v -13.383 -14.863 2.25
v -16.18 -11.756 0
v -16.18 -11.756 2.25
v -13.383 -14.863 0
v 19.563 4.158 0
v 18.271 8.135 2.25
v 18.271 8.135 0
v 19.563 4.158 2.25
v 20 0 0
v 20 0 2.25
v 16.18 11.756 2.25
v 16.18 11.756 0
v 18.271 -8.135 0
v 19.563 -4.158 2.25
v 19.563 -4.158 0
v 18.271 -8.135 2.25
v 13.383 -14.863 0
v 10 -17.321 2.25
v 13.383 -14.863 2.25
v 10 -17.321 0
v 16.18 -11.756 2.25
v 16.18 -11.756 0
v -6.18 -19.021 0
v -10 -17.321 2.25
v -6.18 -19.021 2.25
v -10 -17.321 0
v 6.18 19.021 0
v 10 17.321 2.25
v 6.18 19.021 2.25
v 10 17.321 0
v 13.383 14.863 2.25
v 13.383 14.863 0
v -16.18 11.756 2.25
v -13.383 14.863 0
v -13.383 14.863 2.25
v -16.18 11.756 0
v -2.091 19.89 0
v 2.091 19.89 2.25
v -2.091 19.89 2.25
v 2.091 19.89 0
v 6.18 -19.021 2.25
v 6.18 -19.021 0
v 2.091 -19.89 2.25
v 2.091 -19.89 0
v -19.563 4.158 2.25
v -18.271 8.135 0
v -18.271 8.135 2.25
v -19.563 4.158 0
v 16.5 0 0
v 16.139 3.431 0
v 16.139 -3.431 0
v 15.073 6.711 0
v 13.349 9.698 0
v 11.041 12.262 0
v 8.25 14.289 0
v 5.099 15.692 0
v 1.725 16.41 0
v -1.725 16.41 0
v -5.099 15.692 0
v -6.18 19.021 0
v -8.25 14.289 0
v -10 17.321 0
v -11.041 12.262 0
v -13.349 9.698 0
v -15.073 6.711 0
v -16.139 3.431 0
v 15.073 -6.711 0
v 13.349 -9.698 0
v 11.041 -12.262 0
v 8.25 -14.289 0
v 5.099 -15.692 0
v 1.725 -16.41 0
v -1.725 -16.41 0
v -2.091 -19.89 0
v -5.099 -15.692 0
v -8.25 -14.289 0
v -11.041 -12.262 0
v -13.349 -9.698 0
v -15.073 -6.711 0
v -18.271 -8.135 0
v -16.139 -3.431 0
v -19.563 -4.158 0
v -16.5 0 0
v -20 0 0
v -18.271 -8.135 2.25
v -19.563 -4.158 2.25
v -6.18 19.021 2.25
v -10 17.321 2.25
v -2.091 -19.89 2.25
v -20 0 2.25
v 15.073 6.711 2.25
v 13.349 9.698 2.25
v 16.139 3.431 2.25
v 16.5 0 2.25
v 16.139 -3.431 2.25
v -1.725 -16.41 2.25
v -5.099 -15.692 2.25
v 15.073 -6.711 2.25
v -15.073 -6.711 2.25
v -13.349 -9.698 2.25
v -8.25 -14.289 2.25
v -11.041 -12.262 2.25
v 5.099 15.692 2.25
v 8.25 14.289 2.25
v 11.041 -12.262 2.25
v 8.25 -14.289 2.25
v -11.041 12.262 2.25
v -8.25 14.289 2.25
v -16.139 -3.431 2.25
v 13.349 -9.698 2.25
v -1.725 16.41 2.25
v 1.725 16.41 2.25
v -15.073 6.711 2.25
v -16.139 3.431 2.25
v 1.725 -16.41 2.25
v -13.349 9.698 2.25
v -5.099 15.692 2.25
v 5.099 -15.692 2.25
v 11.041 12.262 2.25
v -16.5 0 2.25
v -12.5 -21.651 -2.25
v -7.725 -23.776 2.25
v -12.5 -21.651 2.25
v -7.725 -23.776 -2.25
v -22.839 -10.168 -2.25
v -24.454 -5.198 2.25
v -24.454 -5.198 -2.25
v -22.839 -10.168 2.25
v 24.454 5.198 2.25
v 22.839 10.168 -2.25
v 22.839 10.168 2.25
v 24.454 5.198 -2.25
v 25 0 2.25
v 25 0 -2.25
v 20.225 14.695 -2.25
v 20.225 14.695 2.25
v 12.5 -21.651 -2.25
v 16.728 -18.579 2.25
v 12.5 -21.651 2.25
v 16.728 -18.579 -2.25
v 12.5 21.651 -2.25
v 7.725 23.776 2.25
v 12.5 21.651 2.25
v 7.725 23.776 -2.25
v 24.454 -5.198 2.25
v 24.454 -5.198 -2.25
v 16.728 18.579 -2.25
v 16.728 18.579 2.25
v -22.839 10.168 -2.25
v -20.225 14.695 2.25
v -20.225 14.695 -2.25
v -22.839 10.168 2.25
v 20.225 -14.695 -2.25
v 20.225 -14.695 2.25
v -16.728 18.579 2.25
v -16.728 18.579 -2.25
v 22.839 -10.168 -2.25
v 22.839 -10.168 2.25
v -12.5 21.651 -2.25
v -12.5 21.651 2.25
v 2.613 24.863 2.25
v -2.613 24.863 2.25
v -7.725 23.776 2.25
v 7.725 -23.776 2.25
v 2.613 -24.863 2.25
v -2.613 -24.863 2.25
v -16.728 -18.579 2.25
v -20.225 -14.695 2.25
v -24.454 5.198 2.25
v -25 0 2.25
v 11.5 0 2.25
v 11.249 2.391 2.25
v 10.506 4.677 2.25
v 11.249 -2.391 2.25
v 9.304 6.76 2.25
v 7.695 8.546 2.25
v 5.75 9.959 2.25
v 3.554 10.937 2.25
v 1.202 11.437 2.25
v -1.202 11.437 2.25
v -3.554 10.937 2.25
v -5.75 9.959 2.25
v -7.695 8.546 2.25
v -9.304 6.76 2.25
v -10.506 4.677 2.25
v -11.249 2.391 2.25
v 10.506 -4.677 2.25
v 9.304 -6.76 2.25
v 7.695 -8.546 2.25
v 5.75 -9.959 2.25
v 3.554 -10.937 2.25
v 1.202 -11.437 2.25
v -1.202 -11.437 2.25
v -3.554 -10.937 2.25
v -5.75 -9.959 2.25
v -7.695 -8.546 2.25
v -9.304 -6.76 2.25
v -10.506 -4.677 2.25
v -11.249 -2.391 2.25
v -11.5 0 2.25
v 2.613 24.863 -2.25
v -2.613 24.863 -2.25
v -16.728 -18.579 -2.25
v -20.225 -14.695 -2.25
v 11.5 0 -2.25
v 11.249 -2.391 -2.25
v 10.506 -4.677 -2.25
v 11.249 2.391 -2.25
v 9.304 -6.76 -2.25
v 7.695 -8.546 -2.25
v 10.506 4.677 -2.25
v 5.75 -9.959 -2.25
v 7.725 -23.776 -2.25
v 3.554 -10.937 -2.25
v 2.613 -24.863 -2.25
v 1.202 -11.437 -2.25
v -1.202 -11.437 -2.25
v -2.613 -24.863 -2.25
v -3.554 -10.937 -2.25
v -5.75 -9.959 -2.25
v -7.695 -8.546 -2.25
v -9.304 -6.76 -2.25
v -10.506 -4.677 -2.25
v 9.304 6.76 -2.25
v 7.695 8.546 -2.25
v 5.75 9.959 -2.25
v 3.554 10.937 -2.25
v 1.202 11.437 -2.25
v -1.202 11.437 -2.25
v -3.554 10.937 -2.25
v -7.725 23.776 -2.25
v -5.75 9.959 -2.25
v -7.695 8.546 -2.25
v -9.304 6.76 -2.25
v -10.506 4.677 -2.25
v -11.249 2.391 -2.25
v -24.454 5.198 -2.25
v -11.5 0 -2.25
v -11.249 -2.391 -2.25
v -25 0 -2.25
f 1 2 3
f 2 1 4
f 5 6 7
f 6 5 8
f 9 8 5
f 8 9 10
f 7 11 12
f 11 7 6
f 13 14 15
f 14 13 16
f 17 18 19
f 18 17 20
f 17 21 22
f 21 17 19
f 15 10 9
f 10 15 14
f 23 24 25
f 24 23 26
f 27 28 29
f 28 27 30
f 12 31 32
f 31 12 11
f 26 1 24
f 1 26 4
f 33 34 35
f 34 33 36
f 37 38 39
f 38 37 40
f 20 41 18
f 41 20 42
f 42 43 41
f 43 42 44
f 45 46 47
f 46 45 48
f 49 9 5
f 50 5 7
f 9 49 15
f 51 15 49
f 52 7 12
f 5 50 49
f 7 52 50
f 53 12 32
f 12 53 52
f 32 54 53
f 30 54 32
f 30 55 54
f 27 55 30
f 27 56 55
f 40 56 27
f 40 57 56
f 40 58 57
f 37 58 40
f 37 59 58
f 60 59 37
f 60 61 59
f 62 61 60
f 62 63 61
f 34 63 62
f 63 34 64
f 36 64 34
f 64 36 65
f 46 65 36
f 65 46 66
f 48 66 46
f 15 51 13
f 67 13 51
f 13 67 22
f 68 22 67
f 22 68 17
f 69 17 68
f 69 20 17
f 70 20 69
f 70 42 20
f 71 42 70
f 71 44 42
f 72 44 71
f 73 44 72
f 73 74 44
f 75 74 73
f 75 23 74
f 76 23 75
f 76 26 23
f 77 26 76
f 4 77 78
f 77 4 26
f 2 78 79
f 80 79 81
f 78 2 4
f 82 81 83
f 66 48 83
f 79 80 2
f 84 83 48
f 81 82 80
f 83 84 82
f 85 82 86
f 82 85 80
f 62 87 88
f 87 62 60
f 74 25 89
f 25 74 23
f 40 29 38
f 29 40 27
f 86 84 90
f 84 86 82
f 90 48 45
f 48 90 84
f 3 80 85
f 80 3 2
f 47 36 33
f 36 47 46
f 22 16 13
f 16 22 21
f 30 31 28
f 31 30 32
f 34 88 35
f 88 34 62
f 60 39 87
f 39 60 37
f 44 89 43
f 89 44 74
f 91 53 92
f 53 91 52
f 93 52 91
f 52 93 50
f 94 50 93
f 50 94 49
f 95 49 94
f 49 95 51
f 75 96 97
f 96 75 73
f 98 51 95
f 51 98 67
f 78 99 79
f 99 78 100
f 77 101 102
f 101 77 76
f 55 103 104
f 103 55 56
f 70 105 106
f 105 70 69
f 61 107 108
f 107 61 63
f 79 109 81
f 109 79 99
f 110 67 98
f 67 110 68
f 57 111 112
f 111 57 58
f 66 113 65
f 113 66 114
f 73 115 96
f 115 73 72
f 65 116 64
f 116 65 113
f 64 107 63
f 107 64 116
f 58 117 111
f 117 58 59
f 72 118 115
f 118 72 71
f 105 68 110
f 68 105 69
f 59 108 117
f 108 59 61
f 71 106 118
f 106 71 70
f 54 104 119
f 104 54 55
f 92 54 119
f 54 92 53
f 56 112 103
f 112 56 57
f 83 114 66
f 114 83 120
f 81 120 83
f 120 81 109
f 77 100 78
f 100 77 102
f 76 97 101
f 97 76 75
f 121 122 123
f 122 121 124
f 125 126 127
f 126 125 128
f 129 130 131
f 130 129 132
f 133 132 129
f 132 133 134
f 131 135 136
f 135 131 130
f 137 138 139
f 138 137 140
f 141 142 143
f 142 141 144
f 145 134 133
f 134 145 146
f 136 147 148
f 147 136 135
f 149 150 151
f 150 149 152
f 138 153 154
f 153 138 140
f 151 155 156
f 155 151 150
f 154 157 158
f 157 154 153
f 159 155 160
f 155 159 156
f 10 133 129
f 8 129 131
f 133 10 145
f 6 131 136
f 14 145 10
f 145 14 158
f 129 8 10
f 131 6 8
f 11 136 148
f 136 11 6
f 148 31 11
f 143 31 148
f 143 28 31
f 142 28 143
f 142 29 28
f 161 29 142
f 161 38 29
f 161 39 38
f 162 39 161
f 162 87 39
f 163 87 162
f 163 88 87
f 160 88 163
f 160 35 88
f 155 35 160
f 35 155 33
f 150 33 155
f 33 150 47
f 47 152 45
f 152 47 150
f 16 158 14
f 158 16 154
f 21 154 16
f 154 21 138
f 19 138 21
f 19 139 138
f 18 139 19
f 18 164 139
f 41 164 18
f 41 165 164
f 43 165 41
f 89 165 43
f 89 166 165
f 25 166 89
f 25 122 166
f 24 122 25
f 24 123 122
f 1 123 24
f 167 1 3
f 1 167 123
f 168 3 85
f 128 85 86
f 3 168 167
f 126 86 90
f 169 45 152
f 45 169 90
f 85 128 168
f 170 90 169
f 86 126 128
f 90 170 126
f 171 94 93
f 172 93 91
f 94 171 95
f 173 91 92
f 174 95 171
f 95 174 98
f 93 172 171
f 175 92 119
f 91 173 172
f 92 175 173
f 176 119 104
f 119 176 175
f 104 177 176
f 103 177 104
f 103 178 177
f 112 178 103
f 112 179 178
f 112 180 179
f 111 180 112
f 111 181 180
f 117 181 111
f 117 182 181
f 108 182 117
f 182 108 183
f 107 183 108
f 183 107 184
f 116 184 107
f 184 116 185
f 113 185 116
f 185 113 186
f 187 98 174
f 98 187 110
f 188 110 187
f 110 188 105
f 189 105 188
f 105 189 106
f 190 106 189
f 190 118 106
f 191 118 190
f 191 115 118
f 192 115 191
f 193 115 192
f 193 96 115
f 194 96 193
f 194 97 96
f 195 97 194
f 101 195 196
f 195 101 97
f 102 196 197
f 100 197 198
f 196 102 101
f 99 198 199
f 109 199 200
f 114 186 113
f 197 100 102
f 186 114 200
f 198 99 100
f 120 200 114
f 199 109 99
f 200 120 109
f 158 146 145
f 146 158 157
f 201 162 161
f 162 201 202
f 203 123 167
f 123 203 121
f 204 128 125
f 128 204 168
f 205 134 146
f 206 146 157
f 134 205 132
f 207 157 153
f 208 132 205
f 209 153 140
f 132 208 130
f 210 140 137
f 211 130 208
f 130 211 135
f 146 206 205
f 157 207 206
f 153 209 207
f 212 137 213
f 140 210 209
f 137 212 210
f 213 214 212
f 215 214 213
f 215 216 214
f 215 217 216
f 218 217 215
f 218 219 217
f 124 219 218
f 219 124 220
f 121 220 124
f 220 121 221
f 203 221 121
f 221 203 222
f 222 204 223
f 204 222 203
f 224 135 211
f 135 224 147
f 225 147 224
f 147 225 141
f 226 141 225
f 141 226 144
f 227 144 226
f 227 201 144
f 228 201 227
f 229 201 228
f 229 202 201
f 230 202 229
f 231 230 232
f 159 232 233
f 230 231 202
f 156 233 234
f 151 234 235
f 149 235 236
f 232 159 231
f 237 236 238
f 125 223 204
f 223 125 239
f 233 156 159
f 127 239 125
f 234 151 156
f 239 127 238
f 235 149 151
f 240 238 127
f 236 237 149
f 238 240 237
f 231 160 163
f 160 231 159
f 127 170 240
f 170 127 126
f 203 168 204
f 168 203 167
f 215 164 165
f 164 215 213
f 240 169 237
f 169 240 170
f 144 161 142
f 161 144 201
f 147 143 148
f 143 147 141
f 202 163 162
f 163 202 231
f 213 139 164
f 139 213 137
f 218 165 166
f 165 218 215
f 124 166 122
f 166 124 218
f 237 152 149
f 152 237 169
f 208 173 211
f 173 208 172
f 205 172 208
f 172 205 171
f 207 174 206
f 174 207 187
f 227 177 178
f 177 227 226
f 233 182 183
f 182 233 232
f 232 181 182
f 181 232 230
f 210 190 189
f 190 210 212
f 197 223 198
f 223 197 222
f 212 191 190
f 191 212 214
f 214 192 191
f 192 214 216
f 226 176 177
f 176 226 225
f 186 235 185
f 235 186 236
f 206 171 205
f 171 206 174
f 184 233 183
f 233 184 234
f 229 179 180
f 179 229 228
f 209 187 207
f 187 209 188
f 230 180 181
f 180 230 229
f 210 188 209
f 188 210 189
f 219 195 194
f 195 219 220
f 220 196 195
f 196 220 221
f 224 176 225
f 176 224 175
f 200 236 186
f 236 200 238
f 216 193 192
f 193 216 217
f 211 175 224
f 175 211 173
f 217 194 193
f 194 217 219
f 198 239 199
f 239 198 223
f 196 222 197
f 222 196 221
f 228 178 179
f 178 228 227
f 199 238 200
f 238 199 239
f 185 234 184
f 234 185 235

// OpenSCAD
// [FL_INDEX: keywords="openscad, 3d_parametric, build_a_gasket_any_size_in_silicone, csg_solid" | COT="Parametric OpenSCAD design from 3DCodeverse"]
// Title: build a gasket any size in silicone


						//DICHIARAZIONI:                     		// DECLARATIONS:

r1=16.5;    //diametro interno guarnizione					// inner diameter seal
r2=20 ;   //diametro esterno guarnizione					// ??outer diameter seal
s=2.5;      //spessore guarnizione						// thickness seal

						//IMPOSTAZIONI FUNZIONI					// FUNCTION SETTINGS

rs1=r1-5; //diametro interno supporto						// inner diameter support
rs2=r2+5; //diametro esterno supporto						// outer diameter support
ss=s+2;      //spessore supporto							// thickness support

						//GUARNIZIONE									// SEAL

difference()
{
cylinder(h=ss,r=rs2,center=true);
cylinder(h=ss+2,r=rs1,center=true);
difference()
{
cylinder(h=s,r=r2,center=true+1);
cylinder(h=s,r=r1,center=true+1);
}
}
